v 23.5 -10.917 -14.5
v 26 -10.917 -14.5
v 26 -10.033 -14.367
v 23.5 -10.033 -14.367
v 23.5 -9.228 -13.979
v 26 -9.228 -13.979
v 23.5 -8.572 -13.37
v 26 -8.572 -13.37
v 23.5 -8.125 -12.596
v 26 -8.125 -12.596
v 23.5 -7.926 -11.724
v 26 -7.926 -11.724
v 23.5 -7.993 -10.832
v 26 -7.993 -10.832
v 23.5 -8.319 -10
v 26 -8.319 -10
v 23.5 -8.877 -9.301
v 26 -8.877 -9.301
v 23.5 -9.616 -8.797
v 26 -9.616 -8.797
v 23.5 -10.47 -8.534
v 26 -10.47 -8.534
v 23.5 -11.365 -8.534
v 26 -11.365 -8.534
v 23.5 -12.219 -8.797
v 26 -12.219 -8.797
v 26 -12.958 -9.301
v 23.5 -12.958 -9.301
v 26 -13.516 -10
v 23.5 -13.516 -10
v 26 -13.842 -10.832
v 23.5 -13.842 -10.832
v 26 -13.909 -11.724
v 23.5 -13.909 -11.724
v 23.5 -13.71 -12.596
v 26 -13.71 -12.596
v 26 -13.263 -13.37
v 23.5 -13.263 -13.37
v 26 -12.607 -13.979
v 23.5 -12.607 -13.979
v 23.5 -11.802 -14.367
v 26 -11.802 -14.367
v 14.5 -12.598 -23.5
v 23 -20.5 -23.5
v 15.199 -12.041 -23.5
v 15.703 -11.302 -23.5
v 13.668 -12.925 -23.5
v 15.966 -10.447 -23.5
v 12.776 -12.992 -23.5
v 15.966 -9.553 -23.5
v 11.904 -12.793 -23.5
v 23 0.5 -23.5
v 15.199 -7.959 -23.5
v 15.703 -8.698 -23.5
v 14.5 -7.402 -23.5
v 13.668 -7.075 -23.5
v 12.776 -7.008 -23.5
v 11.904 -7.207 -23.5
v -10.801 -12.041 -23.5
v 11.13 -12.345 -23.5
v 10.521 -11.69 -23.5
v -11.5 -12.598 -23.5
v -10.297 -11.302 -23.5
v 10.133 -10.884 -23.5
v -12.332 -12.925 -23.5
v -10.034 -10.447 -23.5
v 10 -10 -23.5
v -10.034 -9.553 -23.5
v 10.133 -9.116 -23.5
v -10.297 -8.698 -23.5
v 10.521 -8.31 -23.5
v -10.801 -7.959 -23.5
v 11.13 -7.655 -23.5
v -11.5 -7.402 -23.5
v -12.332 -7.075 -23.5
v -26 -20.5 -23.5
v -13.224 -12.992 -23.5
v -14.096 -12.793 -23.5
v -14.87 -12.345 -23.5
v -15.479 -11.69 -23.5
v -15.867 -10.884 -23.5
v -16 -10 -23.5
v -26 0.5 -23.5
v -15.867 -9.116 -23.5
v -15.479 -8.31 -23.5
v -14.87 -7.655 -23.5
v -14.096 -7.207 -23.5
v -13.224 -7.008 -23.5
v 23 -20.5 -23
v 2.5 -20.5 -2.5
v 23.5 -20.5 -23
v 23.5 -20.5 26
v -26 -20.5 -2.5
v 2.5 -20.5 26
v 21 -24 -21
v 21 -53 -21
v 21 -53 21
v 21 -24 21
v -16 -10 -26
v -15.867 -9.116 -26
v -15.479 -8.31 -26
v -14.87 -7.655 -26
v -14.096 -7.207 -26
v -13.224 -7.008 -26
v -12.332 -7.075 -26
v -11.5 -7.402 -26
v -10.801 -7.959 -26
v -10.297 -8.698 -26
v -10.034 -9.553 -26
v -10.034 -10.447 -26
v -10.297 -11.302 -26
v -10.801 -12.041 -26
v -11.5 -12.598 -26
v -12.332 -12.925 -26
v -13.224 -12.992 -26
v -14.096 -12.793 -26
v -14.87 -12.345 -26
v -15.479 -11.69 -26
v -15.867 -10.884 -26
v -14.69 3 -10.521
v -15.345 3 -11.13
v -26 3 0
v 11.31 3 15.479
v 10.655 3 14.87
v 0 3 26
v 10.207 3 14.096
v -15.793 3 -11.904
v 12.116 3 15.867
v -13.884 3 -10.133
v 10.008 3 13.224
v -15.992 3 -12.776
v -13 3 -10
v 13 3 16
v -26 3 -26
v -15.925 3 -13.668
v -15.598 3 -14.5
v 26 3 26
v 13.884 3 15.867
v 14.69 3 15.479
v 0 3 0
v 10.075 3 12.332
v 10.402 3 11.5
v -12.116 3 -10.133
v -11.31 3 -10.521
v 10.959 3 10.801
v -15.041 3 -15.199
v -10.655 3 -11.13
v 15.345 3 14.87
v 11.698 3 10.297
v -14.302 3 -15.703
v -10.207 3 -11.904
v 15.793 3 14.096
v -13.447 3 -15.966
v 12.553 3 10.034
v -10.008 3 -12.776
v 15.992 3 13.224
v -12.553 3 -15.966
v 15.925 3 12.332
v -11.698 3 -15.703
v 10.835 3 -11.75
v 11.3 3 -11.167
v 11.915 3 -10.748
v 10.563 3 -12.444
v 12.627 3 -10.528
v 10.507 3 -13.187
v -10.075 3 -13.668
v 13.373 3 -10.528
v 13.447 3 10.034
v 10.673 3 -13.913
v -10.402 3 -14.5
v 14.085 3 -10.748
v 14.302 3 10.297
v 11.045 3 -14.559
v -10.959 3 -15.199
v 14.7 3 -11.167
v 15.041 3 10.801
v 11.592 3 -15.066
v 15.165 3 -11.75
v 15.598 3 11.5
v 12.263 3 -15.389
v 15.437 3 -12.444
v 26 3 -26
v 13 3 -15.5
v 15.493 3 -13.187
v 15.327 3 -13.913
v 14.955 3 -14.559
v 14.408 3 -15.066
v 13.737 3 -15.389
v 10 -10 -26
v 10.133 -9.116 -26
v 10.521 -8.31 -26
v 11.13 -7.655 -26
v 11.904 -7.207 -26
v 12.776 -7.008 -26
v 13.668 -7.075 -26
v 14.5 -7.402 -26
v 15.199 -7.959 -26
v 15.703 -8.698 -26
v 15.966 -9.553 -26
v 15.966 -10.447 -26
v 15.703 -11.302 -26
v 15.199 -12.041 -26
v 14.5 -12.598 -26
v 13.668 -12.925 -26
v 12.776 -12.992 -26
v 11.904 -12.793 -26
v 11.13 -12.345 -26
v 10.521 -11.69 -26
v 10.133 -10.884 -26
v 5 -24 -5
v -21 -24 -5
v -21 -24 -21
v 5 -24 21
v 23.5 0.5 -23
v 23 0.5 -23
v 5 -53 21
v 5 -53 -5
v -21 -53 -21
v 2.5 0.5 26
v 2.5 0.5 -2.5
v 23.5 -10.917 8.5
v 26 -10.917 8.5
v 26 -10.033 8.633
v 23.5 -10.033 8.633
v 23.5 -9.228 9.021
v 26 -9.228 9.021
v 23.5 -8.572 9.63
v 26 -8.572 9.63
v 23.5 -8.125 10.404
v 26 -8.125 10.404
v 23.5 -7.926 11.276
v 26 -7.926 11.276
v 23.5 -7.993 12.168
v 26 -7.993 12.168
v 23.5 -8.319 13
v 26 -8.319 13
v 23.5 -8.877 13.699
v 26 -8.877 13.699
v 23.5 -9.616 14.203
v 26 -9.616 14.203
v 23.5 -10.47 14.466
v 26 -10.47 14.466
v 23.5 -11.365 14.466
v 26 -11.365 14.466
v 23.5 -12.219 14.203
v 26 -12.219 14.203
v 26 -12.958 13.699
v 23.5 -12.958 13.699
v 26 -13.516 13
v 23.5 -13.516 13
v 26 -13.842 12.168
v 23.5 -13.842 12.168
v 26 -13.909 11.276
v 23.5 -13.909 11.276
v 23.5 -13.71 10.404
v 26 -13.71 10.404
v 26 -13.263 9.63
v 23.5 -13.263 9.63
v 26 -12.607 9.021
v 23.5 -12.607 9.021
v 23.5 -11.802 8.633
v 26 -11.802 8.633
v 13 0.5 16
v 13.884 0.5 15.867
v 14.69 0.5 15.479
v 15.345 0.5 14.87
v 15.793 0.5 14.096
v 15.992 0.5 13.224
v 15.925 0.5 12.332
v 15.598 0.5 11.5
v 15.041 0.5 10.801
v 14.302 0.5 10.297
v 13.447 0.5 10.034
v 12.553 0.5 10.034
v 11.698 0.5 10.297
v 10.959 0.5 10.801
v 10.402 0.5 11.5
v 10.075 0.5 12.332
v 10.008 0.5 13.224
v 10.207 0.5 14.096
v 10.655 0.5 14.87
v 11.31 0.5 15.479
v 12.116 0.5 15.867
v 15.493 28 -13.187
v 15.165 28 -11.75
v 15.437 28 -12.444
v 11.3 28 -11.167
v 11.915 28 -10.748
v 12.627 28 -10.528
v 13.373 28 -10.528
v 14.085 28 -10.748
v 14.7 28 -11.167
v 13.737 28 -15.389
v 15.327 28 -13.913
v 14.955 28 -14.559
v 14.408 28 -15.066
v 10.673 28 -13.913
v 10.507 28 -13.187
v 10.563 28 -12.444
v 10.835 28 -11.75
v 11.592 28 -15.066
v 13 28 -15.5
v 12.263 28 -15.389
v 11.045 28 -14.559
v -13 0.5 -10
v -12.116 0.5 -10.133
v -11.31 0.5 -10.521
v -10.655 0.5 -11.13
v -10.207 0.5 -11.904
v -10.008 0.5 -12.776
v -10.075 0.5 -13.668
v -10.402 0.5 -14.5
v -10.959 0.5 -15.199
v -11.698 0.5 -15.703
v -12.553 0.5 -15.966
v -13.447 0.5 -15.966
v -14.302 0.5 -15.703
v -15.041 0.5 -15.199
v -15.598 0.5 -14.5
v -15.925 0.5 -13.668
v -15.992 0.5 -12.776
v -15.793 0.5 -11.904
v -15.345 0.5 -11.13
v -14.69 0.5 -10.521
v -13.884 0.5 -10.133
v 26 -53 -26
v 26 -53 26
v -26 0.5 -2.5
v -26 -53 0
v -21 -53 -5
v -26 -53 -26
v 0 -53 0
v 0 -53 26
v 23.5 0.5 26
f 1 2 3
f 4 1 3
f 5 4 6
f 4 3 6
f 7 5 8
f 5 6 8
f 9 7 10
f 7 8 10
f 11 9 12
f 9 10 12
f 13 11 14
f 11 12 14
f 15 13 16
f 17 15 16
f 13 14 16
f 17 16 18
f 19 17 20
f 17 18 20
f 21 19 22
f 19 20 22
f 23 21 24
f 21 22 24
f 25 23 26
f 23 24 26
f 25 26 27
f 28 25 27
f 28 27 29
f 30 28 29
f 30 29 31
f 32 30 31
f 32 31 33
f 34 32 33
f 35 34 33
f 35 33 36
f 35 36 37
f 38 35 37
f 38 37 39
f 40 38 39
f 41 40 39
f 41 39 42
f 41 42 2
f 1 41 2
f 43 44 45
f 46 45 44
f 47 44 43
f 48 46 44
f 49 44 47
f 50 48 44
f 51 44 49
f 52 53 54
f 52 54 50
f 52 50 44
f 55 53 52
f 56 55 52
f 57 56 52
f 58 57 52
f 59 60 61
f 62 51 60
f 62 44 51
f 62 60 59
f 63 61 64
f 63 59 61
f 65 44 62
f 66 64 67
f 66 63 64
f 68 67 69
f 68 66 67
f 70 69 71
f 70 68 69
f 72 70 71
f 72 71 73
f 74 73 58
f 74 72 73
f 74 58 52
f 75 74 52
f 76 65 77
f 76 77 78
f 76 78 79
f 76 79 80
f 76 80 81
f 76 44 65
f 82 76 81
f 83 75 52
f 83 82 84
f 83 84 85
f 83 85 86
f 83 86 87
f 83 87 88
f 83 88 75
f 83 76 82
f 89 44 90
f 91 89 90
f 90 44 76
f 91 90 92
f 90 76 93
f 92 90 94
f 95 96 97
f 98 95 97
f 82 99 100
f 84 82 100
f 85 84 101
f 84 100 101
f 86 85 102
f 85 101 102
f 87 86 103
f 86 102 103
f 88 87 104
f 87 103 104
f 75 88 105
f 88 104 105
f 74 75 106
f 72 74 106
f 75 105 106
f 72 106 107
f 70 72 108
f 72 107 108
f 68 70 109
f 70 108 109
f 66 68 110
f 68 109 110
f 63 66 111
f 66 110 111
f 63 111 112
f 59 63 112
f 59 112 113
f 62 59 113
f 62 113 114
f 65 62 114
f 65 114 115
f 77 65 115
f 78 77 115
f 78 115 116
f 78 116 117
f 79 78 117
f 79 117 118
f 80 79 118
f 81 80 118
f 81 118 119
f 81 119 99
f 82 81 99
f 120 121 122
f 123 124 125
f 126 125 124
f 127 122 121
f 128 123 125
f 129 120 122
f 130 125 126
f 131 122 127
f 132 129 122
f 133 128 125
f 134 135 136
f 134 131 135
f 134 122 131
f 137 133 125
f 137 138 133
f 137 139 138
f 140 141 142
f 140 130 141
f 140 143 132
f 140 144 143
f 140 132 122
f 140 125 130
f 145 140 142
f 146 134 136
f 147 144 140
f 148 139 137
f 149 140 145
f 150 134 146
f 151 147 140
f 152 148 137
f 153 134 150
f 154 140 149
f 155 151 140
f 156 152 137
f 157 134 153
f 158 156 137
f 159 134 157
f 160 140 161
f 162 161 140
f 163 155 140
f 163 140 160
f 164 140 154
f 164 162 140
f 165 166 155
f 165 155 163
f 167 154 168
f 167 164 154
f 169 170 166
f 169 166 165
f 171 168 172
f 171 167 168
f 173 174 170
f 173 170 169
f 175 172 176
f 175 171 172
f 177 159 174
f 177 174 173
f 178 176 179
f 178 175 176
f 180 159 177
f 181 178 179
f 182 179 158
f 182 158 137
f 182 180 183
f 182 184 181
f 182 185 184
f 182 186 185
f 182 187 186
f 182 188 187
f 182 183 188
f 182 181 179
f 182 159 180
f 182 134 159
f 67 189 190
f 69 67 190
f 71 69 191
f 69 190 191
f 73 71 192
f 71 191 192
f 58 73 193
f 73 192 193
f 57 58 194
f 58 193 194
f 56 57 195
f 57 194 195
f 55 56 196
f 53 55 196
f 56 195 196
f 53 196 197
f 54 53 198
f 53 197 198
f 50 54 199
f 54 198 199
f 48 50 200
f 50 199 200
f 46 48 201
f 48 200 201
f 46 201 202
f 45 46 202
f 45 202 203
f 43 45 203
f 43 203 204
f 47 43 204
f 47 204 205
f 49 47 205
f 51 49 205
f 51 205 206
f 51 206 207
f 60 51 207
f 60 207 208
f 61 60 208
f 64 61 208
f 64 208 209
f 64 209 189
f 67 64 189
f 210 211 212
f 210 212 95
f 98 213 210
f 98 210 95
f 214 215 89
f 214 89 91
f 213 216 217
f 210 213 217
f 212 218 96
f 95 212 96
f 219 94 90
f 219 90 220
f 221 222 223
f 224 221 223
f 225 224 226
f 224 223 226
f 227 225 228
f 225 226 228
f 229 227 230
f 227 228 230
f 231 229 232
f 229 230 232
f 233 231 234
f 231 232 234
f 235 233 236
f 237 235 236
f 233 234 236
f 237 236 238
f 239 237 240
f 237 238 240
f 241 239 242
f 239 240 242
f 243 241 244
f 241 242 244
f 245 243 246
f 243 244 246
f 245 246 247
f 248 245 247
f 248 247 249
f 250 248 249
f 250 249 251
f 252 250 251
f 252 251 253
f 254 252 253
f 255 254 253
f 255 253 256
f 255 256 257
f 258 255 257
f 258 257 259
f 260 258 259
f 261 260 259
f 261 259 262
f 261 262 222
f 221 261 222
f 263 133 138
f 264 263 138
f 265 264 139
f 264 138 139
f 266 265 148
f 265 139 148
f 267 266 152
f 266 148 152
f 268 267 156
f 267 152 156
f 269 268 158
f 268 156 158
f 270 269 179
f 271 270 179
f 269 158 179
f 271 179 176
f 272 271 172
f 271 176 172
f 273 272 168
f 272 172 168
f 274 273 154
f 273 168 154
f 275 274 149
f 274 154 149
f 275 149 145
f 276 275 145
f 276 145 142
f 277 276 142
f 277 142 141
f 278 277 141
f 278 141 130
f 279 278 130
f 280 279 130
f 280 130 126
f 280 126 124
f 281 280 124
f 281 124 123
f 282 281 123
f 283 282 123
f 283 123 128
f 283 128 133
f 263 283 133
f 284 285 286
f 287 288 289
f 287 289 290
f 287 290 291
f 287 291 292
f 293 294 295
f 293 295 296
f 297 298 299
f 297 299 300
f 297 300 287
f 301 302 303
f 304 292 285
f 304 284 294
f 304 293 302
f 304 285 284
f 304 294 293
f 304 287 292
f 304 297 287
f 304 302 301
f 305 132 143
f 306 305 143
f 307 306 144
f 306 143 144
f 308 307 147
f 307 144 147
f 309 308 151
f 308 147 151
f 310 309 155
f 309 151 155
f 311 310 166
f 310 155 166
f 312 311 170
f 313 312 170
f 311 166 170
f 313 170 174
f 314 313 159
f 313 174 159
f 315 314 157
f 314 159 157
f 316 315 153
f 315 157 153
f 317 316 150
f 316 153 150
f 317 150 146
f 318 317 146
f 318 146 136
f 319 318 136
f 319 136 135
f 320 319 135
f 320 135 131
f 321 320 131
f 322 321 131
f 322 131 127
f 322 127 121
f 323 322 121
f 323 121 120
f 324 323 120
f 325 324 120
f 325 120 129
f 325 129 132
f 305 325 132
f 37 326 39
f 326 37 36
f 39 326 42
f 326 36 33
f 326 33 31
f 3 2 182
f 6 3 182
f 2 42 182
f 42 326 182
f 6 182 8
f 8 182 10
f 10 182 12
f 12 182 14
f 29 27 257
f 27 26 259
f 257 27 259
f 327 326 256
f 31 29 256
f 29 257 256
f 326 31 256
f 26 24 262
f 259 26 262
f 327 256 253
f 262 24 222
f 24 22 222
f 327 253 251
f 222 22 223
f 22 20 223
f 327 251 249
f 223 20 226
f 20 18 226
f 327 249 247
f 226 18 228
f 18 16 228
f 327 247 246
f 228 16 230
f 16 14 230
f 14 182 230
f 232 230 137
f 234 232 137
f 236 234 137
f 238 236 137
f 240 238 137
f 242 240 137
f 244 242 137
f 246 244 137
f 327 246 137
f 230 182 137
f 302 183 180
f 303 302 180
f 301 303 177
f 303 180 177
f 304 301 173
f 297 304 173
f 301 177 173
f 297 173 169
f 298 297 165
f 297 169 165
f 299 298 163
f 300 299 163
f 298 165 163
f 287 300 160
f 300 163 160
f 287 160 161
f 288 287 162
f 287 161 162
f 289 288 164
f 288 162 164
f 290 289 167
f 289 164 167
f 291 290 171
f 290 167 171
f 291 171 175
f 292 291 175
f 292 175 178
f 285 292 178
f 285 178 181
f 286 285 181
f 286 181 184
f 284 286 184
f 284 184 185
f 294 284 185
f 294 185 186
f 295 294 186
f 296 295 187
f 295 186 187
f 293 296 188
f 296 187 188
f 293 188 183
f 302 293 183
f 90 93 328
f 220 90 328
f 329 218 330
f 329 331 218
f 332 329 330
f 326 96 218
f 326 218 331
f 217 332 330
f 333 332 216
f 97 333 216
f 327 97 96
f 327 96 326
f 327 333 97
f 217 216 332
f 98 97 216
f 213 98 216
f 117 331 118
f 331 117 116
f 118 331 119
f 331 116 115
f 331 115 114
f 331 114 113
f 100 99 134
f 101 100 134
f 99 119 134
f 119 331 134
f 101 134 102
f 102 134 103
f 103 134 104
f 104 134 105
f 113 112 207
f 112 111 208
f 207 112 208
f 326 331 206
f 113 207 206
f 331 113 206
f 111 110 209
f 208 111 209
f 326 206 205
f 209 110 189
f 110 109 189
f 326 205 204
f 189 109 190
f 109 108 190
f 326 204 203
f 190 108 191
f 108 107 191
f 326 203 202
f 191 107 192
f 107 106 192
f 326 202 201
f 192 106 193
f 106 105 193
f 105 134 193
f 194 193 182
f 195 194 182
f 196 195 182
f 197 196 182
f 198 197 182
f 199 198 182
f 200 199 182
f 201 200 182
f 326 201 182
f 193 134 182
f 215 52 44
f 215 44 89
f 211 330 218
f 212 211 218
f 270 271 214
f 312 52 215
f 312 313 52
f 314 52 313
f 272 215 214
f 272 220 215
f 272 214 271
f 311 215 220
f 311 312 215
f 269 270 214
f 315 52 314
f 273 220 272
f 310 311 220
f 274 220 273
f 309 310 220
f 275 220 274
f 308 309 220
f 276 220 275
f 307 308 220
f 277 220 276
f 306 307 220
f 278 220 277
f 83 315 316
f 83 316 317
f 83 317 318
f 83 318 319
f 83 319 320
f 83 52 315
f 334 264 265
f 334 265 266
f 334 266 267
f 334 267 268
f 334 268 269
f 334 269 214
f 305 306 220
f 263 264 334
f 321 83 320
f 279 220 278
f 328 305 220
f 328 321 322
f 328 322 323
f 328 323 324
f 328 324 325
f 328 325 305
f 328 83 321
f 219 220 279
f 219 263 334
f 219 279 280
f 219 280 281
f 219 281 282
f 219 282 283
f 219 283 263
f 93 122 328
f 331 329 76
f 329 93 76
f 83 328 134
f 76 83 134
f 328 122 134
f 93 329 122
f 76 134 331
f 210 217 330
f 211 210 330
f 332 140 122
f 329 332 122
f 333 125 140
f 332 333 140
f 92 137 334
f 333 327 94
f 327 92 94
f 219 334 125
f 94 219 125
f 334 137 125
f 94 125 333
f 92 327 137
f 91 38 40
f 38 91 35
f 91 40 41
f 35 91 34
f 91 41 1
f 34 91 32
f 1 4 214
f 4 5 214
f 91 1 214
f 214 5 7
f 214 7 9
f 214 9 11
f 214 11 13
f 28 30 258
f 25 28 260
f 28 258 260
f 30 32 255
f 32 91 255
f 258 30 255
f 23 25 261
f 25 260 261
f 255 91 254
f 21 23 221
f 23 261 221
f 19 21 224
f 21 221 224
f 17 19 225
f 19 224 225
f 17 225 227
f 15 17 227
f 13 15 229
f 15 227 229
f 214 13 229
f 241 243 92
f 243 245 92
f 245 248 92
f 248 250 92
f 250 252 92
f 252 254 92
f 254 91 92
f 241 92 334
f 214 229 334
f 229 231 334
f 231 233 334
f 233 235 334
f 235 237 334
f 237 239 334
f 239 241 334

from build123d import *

# Parameters (mm, degrees)
BOSS_EXTRUDE1_DEPTH = 3
SKETCH2_R           = 2.5
BOSS_EXTRUDE2_DEPTH = 25
CUT_EXTRUDE1_REACH  = 46.463
SKETCH5_R           = 3
BOSS_EXTRUDE3_DEPTH = 20
BOSS_EXTRUDE4_DEPTH = 3
SKETCH9_W           = 21
SKETCH9_H           = 21
CUT_EXTRUDE3_DEPTH  = 49
SKETCH10_W          = 21
SKETCH10_H          = 21
CUT_EXTRUDE4_DEPTH  = 49
BOSS_EXTRUDE5_DEPTH = 30
CUT_EXTRUDE5_REACH  = 80.67
SKETCH12_R          = 3
CUT_EXTRUDE6_REACH  = 80.67
SKETCH13_R          = 3
SKETCH14_OUTSIDE_W  = 75.88
SKETCH14_OUTSIDE_H  = 75.88
CUT_EXTRUDE8_DEPTH  = 29


with BuildPart() as part:
    # Sketch1 → Boss-Extrude1 (new body)
    with BuildSketch(Plane(origin=(0, 0, 0), x_dir=(1, 0, 0), z_dir=(0, 1, 0))):
        Polygon((0, -26), (26, -26), (26, 26), (-26, 26), (-26, 0), (0, 0), align=None)
    extrude(amount=BOSS_EXTRUDE1_DEPTH)

    # Sketch2 → Boss-Extrude2 (add)
    with BuildSketch(Plane(origin=(0, 3, 0), x_dir=(1, 0, 0), z_dir=(0, 1, 0))):
        with Locations(Location((13, 13, 0), (0, 0, 90))):
            Circle(SKETCH2_R)
    extrude(amount=BOSS_EXTRUDE2_DEPTH)

    # Sketch5 → Cut-Extrude1 (cut, up to next)
    with BuildSketch(Plane(origin=(0, 3, 0), x_dir=(1, 0, 0), z_dir=(0, 1, 0)), mode=Mode.PRIVATE) as cut_extrude1_sk1:
        with Locations(Location((-13, 13, 0), (0, 0, 270))):
            Circle(SKETCH5_R)
    cut_extrude1_tool1 = extrude(cut_extrude1_sk1.sketch, amount=-CUT_EXTRUDE1_REACH, mode=Mode.PRIVATE) & part.part
    # Sketch5 → Cut-Extrude1 (cut, up to next)
    with BuildSketch(Plane(origin=(0, 3, 0), x_dir=(1, 0, 0), z_dir=(0, 1, 0)), mode=Mode.PRIVATE) as cut_extrude1_sk2:
        with Locations(Location((13, -13, 0), (0, 0, 270))):
            Circle(SKETCH5_R)
    cut_extrude1_tool2 = extrude(cut_extrude1_sk2.sketch, amount=-CUT_EXTRUDE1_REACH, mode=Mode.PRIVATE) & part.part
    add(cut_extrude1_tool1.solids().sort_by_distance((-13, 3, -13))[0], mode=Mode.SUBTRACT)
    add(cut_extrude1_tool2.solids().sort_by_distance((13, 3, 13))[0], mode=Mode.SUBTRACT)

    # Sketch7 → Boss-Extrude3 (add)
    with BuildSketch(Plane.XZ):
        Polygon((26, -26), (26, 26), (0, 26), (0, 0), (-26, 0), (-26, -26), align=None)
        Polygon((23, -23), (23, 23), (3, 23), (3, -3), (-23, -3), (-23, -23), align=None, mode=Mode.SUBTRACT)
    extrude(amount=BOSS_EXTRUDE3_DEPTH)

    # Sketch8 → Boss-Extrude4 (add)
    with BuildSketch(Plane.XZ.offset(20)):
        Polygon((-26, -26), (26, -26), (26, 26), (0, 26), (0, 0), (-26, 0), align=None)
    extrude(amount=BOSS_EXTRUDE4_DEPTH)

    # Sketch9 → Cut-Extrude3 (cut)
    with BuildSketch(Plane.XY.offset(26)):
        with Locations((13, -10)):
            Rectangle(SKETCH9_W, SKETCH9_H)
    extrude(amount=-CUT_EXTRUDE3_DEPTH, mode=Mode.SUBTRACT)

    # Sketch10 → Cut-Extrude4 (cut)
    with BuildSketch(Plane.ZY.offset(26)):
        with Locations((-13, -10)):
            Rectangle(SKETCH10_W, SKETCH10_H)
    extrude(amount=-CUT_EXTRUDE4_DEPTH, mode=Mode.SUBTRACT)

    # Sketch11 → Boss-Extrude5 (add)
    with BuildSketch(Plane.XZ.offset(23)):
        Polygon((-26, 0), (-26, -26), (26, -26), (26, 26), (0, 26), (0, 0), align=None)
    extrude(amount=BOSS_EXTRUDE5_DEPTH)

    # Sketch12 → Cut-Extrude5 (cut, up to next)
    with BuildSketch(Plane(origin=(0, 0, -26), x_dir=(-1, 0, 0), z_dir=(0, 0, -1)), mode=Mode.PRIVATE) as cut_extrude5_sk1:
        with Locations((-13, -10)):
            Circle(SKETCH12_R)
    cut_extrude5_tool1 = extrude(cut_extrude5_sk1.sketch, amount=-CUT_EXTRUDE5_REACH, mode=Mode.PRIVATE) & part.part
    # Sketch12 → Cut-Extrude5 (cut, up to next)
    with BuildSketch(Plane(origin=(0, 0, -26), x_dir=(-1, 0, 0), z_dir=(0, 0, -1)), mode=Mode.PRIVATE) as cut_extrude5_sk2:
        with Locations((13, -10)):
            Circle(SKETCH12_R)
    cut_extrude5_tool2 = extrude(cut_extrude5_sk2.sketch, amount=-CUT_EXTRUDE5_REACH, mode=Mode.PRIVATE) & part.part
    add(cut_extrude5_tool1.solids().sort_by_distance((13, -10, -26))[0], mode=Mode.SUBTRACT)
    add(cut_extrude5_tool2.solids().sort_by_distance((-13, -10, -26))[0], mode=Mode.SUBTRACT)

    # Sketch13 → Cut-Extrude6 (cut, up to next)
    with BuildSketch(Plane(origin=(26, 0, 0), x_dir=(0, 0, -1), z_dir=(1, 0, 0)), mode=Mode.PRIVATE) as cut_extrude6_sk1:
        with Locations((-11.5, -10.917464776)):
            Circle(SKETCH13_R)
    cut_extrude6_tool1 = extrude(cut_extrude6_sk1.sketch, amount=-CUT_EXTRUDE6_REACH, mode=Mode.PRIVATE) & part.part
    # Sketch13 → Cut-Extrude6 (cut, up to next)
    with BuildSketch(Plane(origin=(26, 0, 0), x_dir=(0, 0, -1), z_dir=(1, 0, 0)), mode=Mode.PRIVATE) as cut_extrude6_sk2:
        with Locations((11.5, -10.917464776)):
            Circle(SKETCH13_R)
    cut_extrude6_tool2 = extrude(cut_extrude6_sk2.sketch, amount=-CUT_EXTRUDE6_REACH, mode=Mode.PRIVATE) & part.part
    add(cut_extrude6_tool1.solids().sort_by_distance((26, -10.917465, 11.5))[0], mode=Mode.SUBTRACT)
    add(cut_extrude6_tool2.solids().sort_by_distance((26, -10.917465, -11.5))[0], mode=Mode.SUBTRACT)

    # Sketch14 outside → Cut-Extrude8 (cut)
    # profile 1 of 2: a face of its own
    with BuildSketch(Plane.XZ.offset(53)):
        Rectangle(SKETCH14_OUTSIDE_W, SKETCH14_OUTSIDE_H)
        Polygon((0, 0), (-26, 0), (-26, -26), (26, -26), (26, 26), (0, 26), align=None, mode=Mode.SUBTRACT)
    # profile 2 of 2: a face of its own
    with BuildSketch(Plane.XZ.offset(53)):
        Polygon((5, -5), (-21, -5), (-21, -21), (21, -21), (21, 21), (5, 21), align=None)
    extrude(amount=-CUT_EXTRUDE8_DEPTH, mode=Mode.SUBTRACT)


solid = part.part
